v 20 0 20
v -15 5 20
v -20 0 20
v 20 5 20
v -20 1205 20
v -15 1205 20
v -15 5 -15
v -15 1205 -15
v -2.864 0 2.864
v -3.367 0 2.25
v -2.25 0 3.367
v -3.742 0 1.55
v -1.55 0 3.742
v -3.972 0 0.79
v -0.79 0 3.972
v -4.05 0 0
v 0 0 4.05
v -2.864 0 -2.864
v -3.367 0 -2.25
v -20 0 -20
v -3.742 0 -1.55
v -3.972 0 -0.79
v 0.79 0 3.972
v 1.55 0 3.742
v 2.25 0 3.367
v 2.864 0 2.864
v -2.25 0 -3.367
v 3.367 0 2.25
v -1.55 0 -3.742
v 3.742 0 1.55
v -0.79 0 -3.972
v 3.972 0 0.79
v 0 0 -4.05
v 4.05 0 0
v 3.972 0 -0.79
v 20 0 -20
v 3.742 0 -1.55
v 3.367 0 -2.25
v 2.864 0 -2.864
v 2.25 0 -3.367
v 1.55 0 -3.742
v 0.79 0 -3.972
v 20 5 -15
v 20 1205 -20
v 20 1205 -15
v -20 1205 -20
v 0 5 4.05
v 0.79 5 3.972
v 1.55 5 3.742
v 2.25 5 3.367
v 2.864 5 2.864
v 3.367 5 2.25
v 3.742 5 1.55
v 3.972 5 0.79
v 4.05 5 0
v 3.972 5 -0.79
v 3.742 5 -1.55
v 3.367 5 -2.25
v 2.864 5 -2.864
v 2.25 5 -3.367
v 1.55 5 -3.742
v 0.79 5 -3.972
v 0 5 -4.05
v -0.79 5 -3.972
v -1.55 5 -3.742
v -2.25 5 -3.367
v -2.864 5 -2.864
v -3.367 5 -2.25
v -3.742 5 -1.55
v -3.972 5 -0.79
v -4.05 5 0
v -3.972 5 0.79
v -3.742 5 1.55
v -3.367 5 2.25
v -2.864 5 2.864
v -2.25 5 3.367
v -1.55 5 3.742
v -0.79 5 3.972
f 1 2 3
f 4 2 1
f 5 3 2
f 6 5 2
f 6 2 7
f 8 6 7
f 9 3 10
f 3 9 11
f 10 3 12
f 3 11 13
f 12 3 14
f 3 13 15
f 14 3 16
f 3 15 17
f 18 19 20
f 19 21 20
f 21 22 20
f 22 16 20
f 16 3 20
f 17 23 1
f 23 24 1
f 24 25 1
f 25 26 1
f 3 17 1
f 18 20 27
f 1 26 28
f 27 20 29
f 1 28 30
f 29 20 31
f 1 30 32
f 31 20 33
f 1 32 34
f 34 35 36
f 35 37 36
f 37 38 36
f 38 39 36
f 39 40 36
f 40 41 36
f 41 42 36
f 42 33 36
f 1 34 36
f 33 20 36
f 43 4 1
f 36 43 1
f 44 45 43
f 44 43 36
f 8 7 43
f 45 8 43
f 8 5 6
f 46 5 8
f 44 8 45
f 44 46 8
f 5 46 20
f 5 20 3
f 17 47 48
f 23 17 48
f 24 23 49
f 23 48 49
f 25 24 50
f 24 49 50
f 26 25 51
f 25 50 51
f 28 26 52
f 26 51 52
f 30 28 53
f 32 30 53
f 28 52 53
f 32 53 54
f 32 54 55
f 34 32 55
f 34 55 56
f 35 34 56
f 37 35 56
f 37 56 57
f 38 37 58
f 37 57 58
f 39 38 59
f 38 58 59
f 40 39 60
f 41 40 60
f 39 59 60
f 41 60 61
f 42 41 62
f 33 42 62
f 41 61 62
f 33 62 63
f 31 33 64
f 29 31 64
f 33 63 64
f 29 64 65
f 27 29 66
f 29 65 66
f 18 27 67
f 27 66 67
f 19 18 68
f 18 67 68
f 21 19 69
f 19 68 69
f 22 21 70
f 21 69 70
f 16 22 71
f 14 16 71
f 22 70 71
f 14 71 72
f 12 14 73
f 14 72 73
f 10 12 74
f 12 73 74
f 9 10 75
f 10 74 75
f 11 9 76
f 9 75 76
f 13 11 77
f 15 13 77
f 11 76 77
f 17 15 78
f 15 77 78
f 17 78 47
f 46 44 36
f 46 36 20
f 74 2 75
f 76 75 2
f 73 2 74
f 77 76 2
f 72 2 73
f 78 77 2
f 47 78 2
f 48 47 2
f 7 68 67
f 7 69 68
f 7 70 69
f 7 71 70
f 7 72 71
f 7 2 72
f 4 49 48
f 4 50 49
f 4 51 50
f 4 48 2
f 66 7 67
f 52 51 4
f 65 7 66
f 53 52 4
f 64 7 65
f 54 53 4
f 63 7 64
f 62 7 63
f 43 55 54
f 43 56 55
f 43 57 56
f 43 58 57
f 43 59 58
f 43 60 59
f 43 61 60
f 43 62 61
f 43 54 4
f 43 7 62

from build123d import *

# Parameters (mm, degrees)
SKETCH_1_W          = 40
SKETCH_1_H          = 40
EXTRUDE_1_DEPTH     = 5
SKETCH_2_R          = 4.05
CUT_EXTRUDE_1_DEPTH = 5
EXTRUDE_2_DEPTH     = 600


with BuildPart() as part:
    # 草图1 → 凸台-拉伸1 (new body)
    with BuildSketch(Plane(origin=(0, 0, 0), x_dir=(1, 0, 0), z_dir=(0, 1, 0))):
        Rectangle(SKETCH_1_W, SKETCH_1_H)
    extrude(amount=EXTRUDE_1_DEPTH)

    # 草图2 → 切除-拉伸1 (cut)
    with BuildSketch(Plane(origin=(0, 5, 0), x_dir=(1, 0, 0), z_dir=(0, 1, 0))):
        with Locations(Location((0, 0, 0), (0, 0, 270))):
            Circle(SKETCH_2_R)
    extrude(amount=-CUT_EXTRUDE_1_DEPTH, mode=Mode.SUBTRACT)

    # 草图3 → 凸台-拉伸2 (add)
    with BuildSketch(Plane(origin=(0, 5, 0), x_dir=(1, 0, 0), z_dir=(0, 1, 0))):
        Polygon((-20, 20), (-20, -20), (-15, -20), (-15, 15), (20, 15), (20, 20), align=None)
    extrude_2 = extrude(amount=EXTRUDE_2_DEPTH)

    # 镜向1: 凸台-拉伸2 across plane
    add(extrude_2.mirror(Plane.ZX.offset(605)))


solid = part.part
